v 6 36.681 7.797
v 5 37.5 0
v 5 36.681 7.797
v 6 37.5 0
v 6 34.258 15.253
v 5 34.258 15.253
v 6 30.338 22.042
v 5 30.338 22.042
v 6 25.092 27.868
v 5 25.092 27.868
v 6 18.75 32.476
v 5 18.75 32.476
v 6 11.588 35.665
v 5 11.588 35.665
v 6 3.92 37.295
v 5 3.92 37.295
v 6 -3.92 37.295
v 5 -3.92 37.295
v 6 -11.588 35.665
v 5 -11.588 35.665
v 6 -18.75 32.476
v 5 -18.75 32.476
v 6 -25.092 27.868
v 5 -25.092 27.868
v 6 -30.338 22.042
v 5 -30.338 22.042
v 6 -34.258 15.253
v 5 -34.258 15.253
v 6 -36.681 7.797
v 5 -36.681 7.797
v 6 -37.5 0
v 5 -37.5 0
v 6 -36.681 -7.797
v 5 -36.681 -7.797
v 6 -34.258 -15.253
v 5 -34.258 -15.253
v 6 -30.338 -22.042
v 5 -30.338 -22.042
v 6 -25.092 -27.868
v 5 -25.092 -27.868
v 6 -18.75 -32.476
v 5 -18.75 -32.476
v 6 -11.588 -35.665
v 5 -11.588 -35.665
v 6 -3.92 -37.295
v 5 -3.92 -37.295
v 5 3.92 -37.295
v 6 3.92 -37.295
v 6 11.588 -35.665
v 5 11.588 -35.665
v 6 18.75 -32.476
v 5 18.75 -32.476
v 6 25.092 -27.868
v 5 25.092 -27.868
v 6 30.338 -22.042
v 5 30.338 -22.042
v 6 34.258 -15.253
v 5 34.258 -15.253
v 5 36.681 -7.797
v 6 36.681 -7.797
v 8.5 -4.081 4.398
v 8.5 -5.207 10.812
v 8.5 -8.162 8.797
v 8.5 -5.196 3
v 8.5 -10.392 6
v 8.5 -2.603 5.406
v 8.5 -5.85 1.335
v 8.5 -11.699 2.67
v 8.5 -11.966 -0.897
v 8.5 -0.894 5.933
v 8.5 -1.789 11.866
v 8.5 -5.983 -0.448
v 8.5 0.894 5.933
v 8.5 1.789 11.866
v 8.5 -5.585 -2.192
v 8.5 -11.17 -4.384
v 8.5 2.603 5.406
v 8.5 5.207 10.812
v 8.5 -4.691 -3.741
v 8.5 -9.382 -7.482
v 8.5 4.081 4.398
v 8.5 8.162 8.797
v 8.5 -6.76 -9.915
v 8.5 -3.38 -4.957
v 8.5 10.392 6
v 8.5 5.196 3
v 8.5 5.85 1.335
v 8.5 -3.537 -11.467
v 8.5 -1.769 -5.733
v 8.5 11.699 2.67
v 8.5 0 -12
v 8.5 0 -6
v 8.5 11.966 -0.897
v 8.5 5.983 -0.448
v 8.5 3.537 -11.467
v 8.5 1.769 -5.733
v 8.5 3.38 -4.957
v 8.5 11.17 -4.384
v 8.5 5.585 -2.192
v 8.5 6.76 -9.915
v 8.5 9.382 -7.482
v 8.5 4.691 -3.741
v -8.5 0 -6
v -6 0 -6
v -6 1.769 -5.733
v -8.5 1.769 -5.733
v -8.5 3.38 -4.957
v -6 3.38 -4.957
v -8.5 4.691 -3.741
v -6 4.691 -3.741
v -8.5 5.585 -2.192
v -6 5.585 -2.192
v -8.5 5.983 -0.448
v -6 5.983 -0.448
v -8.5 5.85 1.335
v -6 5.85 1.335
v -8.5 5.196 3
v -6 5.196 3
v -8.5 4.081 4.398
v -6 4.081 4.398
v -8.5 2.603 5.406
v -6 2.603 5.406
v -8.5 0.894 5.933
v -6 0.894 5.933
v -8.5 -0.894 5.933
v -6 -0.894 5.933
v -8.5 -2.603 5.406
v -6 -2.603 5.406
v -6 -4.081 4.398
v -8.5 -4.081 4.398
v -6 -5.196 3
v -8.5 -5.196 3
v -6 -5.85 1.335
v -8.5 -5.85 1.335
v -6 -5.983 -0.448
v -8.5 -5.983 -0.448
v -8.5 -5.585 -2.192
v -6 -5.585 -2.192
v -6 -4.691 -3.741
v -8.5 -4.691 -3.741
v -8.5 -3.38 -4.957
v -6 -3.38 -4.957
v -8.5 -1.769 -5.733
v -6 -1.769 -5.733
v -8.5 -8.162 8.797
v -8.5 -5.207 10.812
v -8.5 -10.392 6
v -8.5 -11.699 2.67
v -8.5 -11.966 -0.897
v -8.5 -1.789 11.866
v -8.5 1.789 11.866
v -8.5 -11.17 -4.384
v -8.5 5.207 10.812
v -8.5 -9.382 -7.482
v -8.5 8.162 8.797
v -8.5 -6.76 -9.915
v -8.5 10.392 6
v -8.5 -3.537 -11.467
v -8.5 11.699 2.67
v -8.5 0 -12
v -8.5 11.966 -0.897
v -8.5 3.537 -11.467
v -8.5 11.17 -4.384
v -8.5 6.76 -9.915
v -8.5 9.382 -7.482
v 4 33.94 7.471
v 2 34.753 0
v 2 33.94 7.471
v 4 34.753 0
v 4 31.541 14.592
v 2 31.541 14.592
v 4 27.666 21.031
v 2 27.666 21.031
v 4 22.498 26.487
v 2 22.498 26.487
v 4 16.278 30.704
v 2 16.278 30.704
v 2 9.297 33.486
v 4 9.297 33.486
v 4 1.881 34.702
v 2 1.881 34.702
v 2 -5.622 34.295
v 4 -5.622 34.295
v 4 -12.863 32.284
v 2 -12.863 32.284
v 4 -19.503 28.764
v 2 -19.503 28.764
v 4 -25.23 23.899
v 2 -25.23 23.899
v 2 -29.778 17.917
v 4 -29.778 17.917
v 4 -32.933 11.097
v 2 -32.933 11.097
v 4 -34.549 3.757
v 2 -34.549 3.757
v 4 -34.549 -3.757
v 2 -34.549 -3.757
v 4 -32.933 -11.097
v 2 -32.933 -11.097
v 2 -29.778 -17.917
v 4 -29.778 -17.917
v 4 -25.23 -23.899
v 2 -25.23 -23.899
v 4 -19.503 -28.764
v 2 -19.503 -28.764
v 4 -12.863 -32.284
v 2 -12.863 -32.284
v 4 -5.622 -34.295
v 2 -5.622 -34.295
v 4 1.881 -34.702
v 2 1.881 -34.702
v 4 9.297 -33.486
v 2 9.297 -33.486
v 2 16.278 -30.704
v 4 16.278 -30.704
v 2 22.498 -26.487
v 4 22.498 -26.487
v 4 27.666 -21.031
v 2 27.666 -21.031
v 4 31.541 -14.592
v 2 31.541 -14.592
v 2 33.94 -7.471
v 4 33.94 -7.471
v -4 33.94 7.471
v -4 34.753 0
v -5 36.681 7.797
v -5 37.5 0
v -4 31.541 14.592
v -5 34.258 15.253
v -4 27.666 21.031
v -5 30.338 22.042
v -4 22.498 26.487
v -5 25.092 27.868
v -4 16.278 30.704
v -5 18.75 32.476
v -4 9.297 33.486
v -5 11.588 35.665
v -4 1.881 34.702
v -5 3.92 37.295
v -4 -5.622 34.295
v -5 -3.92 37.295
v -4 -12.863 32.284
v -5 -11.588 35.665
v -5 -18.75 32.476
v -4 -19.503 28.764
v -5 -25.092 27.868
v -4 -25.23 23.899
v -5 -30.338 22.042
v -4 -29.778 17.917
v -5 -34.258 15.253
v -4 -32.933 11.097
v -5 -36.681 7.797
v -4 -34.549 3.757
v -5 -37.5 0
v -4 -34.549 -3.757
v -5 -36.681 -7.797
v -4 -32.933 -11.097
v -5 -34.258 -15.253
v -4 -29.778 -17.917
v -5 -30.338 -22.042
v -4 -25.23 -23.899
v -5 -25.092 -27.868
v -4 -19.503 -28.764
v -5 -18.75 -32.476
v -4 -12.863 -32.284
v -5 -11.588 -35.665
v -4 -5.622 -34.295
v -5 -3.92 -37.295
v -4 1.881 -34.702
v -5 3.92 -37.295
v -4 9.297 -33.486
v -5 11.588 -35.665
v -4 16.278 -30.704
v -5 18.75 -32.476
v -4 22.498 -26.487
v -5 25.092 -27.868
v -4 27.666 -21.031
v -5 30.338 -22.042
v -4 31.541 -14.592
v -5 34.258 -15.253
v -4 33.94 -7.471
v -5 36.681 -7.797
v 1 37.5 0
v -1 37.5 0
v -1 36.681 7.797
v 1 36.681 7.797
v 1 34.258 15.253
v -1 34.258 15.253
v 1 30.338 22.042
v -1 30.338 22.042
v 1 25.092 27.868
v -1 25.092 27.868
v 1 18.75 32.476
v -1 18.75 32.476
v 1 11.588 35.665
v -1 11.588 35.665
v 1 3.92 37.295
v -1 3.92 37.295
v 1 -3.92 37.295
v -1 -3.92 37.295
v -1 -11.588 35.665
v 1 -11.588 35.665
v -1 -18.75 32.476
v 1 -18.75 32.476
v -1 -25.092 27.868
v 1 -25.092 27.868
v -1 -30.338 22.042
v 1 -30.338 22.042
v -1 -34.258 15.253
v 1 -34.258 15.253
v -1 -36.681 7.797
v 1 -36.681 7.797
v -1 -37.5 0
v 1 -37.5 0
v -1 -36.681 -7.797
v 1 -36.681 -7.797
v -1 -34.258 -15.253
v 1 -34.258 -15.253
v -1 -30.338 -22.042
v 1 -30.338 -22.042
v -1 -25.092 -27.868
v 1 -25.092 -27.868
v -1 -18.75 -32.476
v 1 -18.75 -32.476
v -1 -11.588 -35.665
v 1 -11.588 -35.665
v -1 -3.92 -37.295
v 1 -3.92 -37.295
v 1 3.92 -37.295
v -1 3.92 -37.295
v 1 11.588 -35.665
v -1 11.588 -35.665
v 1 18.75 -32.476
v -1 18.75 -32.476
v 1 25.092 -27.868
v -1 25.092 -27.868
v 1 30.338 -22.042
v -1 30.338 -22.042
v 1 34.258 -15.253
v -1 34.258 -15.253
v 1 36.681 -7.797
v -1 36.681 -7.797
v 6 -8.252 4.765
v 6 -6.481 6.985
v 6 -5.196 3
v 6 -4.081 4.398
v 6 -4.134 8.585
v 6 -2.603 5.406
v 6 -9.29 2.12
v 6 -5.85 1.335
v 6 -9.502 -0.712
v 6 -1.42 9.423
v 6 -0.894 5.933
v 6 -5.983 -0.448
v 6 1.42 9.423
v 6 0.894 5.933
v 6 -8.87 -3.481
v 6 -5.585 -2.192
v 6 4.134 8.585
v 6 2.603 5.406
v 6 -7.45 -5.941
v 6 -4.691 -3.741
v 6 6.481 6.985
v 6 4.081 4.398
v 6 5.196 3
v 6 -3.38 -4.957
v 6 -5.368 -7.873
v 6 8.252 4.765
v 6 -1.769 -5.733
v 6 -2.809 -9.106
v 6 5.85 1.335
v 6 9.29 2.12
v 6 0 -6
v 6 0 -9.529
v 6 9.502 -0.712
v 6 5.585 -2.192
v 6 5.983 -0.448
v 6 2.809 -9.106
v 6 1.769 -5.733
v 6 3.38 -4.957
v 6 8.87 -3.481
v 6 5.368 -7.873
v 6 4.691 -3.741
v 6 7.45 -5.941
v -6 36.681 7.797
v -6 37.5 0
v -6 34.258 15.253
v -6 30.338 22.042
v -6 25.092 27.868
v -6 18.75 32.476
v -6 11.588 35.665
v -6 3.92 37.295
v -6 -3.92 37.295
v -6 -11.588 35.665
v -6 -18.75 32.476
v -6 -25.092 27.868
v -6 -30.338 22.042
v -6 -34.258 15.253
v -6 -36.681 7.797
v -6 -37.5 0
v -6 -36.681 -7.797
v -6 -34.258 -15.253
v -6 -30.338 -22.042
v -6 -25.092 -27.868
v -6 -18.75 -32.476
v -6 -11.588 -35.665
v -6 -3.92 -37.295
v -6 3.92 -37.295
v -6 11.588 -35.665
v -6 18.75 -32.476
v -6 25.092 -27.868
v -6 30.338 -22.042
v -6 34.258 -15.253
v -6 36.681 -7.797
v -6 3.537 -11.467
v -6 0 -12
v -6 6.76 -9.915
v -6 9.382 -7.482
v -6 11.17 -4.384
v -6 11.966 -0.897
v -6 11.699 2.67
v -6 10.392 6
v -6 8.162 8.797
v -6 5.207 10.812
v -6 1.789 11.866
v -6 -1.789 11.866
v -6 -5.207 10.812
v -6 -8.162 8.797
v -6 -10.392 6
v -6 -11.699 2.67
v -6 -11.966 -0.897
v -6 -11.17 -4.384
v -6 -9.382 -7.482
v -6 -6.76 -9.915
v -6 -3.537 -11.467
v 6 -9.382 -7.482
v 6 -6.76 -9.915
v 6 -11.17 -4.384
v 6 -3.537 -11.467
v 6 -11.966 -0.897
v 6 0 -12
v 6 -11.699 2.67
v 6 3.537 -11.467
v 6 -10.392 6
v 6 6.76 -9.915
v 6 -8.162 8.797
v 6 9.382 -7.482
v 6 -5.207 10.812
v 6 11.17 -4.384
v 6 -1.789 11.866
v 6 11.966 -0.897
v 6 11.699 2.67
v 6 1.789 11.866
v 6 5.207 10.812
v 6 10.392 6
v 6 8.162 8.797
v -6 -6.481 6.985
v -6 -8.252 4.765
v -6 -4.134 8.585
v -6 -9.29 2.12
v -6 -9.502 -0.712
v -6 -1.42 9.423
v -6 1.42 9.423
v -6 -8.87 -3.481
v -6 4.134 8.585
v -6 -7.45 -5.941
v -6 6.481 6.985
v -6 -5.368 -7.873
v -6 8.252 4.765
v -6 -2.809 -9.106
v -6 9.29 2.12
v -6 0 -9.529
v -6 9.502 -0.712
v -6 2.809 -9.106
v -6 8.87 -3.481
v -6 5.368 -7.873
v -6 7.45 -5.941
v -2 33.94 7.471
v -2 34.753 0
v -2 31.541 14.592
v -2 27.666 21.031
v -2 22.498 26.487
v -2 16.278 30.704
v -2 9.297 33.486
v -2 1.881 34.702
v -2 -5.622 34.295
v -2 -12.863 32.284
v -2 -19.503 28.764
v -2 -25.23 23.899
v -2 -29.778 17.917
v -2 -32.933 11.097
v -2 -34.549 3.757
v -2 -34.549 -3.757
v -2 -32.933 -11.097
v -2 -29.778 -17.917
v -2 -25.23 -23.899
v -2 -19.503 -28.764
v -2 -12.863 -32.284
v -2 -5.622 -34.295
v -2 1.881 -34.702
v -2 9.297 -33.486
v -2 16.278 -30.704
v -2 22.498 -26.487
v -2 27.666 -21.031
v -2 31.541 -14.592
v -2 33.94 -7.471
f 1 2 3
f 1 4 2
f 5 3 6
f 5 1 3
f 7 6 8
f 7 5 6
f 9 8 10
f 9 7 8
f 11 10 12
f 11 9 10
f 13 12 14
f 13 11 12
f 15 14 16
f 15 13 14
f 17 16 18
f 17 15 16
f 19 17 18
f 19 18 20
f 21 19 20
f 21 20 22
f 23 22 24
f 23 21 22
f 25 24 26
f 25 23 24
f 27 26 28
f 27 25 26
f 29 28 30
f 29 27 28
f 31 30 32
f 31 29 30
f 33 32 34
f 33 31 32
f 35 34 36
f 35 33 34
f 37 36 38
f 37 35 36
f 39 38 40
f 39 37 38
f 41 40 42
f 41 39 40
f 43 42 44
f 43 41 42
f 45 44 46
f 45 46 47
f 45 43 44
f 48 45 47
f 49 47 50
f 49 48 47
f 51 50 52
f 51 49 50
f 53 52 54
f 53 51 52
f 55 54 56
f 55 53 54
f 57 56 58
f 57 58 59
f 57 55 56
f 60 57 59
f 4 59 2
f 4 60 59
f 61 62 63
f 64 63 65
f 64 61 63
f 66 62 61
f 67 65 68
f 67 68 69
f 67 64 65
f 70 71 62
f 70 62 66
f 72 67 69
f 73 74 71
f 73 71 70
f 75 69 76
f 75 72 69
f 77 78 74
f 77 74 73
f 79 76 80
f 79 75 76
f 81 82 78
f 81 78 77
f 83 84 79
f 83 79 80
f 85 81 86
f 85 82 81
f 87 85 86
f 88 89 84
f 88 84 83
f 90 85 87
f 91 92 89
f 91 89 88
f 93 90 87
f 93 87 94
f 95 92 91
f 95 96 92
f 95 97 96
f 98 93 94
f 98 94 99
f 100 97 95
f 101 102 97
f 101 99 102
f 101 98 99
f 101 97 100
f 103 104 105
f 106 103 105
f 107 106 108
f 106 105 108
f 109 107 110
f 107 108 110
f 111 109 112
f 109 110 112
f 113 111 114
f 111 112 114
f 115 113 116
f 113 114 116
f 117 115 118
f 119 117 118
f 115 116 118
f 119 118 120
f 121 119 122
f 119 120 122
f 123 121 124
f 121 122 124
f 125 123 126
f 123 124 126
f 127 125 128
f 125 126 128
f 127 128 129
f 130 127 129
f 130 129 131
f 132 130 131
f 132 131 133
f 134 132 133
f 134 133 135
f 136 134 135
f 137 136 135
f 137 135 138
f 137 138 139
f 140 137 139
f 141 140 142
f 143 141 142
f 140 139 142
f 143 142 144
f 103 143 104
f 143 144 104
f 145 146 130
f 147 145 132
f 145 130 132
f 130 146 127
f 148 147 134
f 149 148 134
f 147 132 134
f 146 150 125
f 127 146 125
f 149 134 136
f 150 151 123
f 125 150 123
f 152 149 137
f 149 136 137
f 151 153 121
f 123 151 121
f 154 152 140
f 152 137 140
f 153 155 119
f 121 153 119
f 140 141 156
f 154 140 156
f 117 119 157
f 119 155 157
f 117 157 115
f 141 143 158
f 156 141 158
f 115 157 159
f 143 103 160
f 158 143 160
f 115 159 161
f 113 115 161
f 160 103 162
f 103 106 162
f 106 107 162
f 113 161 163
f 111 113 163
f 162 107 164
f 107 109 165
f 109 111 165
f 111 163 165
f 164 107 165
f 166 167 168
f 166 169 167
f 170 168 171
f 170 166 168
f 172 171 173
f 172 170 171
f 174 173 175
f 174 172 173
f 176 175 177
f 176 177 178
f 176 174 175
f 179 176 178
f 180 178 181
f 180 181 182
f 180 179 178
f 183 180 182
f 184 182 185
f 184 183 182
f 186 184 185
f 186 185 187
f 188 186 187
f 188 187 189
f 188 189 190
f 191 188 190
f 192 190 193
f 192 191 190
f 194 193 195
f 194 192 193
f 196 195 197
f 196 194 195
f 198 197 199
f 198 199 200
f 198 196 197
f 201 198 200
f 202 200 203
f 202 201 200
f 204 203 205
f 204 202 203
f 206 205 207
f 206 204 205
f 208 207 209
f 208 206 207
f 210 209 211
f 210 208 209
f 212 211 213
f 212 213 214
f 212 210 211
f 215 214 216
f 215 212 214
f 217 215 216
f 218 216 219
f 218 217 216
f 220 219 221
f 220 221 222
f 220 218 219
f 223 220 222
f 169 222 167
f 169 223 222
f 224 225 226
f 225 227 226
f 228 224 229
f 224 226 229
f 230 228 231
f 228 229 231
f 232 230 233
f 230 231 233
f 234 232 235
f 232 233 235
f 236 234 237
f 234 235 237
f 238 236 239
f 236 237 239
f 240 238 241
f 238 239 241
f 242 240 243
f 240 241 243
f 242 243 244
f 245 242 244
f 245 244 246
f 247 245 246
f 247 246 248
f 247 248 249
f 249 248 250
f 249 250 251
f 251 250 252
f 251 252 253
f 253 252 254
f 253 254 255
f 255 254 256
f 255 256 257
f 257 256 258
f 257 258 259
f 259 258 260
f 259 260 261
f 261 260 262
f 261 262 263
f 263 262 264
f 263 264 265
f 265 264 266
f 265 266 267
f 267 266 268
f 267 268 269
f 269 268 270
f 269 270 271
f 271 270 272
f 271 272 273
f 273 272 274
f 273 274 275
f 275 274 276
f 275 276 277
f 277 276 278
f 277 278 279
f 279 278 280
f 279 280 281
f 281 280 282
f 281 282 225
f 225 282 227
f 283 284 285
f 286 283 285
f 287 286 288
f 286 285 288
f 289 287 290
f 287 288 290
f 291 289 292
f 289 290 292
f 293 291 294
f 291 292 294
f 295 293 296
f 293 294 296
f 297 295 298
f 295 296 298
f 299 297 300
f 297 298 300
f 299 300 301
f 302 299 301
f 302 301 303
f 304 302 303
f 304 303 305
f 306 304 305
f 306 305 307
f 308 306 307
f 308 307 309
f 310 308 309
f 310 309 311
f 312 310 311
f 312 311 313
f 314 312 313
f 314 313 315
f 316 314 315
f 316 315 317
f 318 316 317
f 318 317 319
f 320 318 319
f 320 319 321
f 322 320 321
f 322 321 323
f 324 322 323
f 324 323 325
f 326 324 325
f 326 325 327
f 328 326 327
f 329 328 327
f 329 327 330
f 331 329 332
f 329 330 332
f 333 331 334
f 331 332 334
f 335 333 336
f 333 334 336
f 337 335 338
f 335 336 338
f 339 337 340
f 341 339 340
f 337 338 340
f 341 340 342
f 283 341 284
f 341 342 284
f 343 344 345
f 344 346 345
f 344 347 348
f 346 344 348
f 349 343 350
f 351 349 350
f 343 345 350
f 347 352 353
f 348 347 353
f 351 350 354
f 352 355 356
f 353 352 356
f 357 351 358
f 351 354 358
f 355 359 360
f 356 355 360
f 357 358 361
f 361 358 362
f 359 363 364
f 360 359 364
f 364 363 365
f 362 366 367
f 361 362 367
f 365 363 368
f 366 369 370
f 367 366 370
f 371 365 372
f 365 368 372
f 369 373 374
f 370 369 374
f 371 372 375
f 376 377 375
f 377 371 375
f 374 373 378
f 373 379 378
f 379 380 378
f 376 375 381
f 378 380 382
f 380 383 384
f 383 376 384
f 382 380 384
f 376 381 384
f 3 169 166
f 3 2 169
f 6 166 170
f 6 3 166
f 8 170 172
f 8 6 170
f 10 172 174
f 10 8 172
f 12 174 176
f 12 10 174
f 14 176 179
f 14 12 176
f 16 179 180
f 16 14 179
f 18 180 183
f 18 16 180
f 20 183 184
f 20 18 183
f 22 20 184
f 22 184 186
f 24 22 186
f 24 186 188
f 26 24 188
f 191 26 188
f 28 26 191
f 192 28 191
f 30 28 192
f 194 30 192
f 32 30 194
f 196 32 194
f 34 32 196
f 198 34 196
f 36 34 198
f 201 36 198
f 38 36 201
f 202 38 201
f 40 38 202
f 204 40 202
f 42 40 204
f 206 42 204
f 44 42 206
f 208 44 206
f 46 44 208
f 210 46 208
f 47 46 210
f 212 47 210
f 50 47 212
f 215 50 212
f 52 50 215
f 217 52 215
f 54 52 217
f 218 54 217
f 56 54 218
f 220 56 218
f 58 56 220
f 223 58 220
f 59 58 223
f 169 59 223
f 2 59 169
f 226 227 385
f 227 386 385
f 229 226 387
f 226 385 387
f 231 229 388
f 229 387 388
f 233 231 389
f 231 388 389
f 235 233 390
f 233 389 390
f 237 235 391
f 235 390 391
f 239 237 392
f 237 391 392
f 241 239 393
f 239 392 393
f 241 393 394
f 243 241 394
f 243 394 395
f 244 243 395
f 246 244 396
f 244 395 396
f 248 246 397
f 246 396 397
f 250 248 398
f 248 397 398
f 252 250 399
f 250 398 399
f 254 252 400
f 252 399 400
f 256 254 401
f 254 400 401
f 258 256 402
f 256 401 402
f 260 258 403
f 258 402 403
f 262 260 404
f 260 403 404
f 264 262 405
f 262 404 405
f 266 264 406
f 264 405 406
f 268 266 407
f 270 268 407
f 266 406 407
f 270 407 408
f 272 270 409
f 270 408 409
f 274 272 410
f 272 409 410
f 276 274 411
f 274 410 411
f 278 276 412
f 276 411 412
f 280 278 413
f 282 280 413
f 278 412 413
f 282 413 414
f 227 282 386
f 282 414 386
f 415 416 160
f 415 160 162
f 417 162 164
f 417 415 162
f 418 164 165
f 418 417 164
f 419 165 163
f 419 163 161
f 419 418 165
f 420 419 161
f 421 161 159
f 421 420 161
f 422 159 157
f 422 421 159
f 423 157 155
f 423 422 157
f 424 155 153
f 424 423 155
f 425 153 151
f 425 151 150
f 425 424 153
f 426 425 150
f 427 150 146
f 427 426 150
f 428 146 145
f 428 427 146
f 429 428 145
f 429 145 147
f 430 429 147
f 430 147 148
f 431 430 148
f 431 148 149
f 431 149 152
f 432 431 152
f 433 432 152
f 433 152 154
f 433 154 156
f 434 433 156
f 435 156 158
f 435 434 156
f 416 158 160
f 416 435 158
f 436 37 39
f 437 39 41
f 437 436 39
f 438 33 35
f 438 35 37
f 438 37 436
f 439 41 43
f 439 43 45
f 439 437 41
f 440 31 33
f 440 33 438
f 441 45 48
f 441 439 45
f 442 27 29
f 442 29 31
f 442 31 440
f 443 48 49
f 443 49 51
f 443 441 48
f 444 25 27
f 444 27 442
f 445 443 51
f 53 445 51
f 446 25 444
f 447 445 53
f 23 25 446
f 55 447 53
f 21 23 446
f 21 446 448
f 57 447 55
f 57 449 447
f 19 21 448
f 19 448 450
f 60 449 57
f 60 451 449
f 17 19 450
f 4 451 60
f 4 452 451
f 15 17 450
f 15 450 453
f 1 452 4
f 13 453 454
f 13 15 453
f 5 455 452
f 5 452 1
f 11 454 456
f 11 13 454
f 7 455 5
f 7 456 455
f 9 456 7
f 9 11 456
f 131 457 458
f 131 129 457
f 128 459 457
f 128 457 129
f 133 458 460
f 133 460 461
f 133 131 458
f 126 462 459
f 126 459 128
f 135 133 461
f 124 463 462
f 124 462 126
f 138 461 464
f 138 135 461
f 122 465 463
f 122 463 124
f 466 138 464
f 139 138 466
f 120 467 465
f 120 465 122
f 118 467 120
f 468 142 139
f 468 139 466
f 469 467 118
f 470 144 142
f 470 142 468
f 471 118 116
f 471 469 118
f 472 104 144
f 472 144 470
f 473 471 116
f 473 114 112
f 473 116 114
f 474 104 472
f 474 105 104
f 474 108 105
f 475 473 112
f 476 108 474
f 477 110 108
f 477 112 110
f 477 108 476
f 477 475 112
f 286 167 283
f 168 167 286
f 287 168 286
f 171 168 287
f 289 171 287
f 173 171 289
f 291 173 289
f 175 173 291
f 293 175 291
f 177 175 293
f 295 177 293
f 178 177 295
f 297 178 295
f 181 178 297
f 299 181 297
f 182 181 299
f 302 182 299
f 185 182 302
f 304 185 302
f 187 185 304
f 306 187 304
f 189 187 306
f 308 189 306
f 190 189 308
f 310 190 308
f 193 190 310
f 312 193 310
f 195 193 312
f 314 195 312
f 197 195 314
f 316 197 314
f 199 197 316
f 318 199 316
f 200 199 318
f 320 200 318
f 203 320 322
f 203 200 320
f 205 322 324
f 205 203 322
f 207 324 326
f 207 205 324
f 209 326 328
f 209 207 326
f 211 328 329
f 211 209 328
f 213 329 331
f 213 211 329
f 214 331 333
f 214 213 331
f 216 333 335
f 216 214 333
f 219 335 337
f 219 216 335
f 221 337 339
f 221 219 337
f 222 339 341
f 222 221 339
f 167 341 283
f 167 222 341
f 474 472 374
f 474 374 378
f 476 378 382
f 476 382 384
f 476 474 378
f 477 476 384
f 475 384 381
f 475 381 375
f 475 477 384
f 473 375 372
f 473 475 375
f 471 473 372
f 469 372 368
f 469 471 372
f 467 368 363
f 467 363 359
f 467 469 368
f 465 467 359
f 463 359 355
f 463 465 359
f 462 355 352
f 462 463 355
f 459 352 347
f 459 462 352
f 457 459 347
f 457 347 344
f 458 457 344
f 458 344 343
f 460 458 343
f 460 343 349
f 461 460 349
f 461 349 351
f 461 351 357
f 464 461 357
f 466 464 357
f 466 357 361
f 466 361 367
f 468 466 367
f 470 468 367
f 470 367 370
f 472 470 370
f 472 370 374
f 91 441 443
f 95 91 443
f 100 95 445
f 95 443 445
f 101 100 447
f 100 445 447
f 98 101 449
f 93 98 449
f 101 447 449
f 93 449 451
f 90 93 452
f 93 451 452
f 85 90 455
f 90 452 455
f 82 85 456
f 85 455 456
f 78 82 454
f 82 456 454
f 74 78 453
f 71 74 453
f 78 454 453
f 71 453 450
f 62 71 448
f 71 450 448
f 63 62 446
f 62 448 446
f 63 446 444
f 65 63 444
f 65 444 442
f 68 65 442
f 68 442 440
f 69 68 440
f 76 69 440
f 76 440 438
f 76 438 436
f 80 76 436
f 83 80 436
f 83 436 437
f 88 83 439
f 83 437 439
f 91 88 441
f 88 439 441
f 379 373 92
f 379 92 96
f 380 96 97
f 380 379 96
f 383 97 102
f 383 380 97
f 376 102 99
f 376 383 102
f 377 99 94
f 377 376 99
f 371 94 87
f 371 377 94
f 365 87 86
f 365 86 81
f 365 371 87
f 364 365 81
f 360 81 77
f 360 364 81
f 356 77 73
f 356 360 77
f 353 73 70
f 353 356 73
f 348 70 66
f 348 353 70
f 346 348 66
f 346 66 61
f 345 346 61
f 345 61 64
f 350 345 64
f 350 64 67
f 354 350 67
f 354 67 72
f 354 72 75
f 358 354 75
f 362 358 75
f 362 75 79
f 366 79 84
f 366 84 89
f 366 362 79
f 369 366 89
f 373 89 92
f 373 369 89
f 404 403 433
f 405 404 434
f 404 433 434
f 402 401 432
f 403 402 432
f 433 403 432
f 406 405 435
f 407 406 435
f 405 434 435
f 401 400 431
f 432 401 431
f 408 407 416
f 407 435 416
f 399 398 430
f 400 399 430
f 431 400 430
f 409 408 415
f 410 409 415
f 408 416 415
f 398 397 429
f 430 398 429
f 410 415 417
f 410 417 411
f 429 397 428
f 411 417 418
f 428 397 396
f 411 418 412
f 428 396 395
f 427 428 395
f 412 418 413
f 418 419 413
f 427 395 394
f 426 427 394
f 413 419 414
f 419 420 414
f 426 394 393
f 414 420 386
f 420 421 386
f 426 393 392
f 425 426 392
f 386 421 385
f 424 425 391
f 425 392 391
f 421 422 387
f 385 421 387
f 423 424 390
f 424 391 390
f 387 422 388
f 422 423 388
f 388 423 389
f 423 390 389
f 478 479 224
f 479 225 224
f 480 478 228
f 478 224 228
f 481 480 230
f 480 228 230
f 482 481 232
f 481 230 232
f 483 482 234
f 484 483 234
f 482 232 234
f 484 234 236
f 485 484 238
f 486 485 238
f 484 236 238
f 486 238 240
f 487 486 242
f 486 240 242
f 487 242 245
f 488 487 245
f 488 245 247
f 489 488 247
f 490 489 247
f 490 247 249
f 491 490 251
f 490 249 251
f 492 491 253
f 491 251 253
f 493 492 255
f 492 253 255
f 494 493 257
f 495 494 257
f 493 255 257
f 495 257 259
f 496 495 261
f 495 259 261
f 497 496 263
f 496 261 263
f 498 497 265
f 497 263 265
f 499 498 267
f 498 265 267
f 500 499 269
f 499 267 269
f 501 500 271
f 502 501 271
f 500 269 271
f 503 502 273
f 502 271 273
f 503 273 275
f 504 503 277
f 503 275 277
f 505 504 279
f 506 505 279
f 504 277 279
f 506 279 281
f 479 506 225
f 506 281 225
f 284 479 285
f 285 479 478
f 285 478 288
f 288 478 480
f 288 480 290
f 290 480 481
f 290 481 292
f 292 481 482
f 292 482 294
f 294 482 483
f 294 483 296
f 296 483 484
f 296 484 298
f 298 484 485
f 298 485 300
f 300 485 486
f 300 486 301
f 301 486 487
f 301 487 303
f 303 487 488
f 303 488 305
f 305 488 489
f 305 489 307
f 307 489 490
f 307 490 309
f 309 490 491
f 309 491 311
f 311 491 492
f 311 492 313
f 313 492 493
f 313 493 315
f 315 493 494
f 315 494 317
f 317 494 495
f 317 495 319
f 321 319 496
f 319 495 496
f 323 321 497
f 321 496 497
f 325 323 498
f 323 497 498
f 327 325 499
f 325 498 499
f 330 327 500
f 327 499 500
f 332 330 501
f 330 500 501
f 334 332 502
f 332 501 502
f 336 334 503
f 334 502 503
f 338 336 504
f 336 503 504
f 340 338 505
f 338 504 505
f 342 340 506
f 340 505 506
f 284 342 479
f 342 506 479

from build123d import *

# Parameters (mm, degrees)
SKETCH2_R           = 9.52900057
CUT_EXTRUDE2_DEPTH  = 62
SKETCH3_R           = 12
SKETCH3_R_2         = 6
BOSS_EXTRUDE1_DEPTH = 2.5


with BuildPart() as part:
    # Sketch1 → Revolve1 (revolve)
    with BuildSketch(Plane.XY):
        Polygon((0, 0), (0, 37.5), (1, 37.5), (2, 34.752522581), (4, 34.752522581), (5, 37.5), (6, 37.5), (6, 0), align=None)
    revolve(axis=Axis((0, 0, 0), (1, 0, 0)))

    # Sketch2 → Cut-Extrude2 (cut)
    with BuildSketch(Plane(origin=(6, 0, 0), x_dir=(0, 0, -1), z_dir=(1, 0, 0))):
        Circle(SKETCH2_R)
    extrude(amount=-CUT_EXTRUDE2_DEPTH, mode=Mode.SUBTRACT)

    # Sketch3 → Boss-Extrude1 (add)
    with BuildSketch(Plane(origin=(6, 0, 0), x_dir=(0, 0, -1), z_dir=(1, 0, 0))):
        Circle(SKETCH3_R)
        Circle(SKETCH3_R_2, mode=Mode.SUBTRACT)
    extrude(amount=BOSS_EXTRUDE1_DEPTH)

    # Mirror1: part across plane


with BuildPart() as part_1:
    add(part.part)
    add(part.part.mirror(Plane(origin=(0, 0, 0), x_dir=(0, 0, 1), z_dir=(1, 0, 0))))


solid = part_1.part
